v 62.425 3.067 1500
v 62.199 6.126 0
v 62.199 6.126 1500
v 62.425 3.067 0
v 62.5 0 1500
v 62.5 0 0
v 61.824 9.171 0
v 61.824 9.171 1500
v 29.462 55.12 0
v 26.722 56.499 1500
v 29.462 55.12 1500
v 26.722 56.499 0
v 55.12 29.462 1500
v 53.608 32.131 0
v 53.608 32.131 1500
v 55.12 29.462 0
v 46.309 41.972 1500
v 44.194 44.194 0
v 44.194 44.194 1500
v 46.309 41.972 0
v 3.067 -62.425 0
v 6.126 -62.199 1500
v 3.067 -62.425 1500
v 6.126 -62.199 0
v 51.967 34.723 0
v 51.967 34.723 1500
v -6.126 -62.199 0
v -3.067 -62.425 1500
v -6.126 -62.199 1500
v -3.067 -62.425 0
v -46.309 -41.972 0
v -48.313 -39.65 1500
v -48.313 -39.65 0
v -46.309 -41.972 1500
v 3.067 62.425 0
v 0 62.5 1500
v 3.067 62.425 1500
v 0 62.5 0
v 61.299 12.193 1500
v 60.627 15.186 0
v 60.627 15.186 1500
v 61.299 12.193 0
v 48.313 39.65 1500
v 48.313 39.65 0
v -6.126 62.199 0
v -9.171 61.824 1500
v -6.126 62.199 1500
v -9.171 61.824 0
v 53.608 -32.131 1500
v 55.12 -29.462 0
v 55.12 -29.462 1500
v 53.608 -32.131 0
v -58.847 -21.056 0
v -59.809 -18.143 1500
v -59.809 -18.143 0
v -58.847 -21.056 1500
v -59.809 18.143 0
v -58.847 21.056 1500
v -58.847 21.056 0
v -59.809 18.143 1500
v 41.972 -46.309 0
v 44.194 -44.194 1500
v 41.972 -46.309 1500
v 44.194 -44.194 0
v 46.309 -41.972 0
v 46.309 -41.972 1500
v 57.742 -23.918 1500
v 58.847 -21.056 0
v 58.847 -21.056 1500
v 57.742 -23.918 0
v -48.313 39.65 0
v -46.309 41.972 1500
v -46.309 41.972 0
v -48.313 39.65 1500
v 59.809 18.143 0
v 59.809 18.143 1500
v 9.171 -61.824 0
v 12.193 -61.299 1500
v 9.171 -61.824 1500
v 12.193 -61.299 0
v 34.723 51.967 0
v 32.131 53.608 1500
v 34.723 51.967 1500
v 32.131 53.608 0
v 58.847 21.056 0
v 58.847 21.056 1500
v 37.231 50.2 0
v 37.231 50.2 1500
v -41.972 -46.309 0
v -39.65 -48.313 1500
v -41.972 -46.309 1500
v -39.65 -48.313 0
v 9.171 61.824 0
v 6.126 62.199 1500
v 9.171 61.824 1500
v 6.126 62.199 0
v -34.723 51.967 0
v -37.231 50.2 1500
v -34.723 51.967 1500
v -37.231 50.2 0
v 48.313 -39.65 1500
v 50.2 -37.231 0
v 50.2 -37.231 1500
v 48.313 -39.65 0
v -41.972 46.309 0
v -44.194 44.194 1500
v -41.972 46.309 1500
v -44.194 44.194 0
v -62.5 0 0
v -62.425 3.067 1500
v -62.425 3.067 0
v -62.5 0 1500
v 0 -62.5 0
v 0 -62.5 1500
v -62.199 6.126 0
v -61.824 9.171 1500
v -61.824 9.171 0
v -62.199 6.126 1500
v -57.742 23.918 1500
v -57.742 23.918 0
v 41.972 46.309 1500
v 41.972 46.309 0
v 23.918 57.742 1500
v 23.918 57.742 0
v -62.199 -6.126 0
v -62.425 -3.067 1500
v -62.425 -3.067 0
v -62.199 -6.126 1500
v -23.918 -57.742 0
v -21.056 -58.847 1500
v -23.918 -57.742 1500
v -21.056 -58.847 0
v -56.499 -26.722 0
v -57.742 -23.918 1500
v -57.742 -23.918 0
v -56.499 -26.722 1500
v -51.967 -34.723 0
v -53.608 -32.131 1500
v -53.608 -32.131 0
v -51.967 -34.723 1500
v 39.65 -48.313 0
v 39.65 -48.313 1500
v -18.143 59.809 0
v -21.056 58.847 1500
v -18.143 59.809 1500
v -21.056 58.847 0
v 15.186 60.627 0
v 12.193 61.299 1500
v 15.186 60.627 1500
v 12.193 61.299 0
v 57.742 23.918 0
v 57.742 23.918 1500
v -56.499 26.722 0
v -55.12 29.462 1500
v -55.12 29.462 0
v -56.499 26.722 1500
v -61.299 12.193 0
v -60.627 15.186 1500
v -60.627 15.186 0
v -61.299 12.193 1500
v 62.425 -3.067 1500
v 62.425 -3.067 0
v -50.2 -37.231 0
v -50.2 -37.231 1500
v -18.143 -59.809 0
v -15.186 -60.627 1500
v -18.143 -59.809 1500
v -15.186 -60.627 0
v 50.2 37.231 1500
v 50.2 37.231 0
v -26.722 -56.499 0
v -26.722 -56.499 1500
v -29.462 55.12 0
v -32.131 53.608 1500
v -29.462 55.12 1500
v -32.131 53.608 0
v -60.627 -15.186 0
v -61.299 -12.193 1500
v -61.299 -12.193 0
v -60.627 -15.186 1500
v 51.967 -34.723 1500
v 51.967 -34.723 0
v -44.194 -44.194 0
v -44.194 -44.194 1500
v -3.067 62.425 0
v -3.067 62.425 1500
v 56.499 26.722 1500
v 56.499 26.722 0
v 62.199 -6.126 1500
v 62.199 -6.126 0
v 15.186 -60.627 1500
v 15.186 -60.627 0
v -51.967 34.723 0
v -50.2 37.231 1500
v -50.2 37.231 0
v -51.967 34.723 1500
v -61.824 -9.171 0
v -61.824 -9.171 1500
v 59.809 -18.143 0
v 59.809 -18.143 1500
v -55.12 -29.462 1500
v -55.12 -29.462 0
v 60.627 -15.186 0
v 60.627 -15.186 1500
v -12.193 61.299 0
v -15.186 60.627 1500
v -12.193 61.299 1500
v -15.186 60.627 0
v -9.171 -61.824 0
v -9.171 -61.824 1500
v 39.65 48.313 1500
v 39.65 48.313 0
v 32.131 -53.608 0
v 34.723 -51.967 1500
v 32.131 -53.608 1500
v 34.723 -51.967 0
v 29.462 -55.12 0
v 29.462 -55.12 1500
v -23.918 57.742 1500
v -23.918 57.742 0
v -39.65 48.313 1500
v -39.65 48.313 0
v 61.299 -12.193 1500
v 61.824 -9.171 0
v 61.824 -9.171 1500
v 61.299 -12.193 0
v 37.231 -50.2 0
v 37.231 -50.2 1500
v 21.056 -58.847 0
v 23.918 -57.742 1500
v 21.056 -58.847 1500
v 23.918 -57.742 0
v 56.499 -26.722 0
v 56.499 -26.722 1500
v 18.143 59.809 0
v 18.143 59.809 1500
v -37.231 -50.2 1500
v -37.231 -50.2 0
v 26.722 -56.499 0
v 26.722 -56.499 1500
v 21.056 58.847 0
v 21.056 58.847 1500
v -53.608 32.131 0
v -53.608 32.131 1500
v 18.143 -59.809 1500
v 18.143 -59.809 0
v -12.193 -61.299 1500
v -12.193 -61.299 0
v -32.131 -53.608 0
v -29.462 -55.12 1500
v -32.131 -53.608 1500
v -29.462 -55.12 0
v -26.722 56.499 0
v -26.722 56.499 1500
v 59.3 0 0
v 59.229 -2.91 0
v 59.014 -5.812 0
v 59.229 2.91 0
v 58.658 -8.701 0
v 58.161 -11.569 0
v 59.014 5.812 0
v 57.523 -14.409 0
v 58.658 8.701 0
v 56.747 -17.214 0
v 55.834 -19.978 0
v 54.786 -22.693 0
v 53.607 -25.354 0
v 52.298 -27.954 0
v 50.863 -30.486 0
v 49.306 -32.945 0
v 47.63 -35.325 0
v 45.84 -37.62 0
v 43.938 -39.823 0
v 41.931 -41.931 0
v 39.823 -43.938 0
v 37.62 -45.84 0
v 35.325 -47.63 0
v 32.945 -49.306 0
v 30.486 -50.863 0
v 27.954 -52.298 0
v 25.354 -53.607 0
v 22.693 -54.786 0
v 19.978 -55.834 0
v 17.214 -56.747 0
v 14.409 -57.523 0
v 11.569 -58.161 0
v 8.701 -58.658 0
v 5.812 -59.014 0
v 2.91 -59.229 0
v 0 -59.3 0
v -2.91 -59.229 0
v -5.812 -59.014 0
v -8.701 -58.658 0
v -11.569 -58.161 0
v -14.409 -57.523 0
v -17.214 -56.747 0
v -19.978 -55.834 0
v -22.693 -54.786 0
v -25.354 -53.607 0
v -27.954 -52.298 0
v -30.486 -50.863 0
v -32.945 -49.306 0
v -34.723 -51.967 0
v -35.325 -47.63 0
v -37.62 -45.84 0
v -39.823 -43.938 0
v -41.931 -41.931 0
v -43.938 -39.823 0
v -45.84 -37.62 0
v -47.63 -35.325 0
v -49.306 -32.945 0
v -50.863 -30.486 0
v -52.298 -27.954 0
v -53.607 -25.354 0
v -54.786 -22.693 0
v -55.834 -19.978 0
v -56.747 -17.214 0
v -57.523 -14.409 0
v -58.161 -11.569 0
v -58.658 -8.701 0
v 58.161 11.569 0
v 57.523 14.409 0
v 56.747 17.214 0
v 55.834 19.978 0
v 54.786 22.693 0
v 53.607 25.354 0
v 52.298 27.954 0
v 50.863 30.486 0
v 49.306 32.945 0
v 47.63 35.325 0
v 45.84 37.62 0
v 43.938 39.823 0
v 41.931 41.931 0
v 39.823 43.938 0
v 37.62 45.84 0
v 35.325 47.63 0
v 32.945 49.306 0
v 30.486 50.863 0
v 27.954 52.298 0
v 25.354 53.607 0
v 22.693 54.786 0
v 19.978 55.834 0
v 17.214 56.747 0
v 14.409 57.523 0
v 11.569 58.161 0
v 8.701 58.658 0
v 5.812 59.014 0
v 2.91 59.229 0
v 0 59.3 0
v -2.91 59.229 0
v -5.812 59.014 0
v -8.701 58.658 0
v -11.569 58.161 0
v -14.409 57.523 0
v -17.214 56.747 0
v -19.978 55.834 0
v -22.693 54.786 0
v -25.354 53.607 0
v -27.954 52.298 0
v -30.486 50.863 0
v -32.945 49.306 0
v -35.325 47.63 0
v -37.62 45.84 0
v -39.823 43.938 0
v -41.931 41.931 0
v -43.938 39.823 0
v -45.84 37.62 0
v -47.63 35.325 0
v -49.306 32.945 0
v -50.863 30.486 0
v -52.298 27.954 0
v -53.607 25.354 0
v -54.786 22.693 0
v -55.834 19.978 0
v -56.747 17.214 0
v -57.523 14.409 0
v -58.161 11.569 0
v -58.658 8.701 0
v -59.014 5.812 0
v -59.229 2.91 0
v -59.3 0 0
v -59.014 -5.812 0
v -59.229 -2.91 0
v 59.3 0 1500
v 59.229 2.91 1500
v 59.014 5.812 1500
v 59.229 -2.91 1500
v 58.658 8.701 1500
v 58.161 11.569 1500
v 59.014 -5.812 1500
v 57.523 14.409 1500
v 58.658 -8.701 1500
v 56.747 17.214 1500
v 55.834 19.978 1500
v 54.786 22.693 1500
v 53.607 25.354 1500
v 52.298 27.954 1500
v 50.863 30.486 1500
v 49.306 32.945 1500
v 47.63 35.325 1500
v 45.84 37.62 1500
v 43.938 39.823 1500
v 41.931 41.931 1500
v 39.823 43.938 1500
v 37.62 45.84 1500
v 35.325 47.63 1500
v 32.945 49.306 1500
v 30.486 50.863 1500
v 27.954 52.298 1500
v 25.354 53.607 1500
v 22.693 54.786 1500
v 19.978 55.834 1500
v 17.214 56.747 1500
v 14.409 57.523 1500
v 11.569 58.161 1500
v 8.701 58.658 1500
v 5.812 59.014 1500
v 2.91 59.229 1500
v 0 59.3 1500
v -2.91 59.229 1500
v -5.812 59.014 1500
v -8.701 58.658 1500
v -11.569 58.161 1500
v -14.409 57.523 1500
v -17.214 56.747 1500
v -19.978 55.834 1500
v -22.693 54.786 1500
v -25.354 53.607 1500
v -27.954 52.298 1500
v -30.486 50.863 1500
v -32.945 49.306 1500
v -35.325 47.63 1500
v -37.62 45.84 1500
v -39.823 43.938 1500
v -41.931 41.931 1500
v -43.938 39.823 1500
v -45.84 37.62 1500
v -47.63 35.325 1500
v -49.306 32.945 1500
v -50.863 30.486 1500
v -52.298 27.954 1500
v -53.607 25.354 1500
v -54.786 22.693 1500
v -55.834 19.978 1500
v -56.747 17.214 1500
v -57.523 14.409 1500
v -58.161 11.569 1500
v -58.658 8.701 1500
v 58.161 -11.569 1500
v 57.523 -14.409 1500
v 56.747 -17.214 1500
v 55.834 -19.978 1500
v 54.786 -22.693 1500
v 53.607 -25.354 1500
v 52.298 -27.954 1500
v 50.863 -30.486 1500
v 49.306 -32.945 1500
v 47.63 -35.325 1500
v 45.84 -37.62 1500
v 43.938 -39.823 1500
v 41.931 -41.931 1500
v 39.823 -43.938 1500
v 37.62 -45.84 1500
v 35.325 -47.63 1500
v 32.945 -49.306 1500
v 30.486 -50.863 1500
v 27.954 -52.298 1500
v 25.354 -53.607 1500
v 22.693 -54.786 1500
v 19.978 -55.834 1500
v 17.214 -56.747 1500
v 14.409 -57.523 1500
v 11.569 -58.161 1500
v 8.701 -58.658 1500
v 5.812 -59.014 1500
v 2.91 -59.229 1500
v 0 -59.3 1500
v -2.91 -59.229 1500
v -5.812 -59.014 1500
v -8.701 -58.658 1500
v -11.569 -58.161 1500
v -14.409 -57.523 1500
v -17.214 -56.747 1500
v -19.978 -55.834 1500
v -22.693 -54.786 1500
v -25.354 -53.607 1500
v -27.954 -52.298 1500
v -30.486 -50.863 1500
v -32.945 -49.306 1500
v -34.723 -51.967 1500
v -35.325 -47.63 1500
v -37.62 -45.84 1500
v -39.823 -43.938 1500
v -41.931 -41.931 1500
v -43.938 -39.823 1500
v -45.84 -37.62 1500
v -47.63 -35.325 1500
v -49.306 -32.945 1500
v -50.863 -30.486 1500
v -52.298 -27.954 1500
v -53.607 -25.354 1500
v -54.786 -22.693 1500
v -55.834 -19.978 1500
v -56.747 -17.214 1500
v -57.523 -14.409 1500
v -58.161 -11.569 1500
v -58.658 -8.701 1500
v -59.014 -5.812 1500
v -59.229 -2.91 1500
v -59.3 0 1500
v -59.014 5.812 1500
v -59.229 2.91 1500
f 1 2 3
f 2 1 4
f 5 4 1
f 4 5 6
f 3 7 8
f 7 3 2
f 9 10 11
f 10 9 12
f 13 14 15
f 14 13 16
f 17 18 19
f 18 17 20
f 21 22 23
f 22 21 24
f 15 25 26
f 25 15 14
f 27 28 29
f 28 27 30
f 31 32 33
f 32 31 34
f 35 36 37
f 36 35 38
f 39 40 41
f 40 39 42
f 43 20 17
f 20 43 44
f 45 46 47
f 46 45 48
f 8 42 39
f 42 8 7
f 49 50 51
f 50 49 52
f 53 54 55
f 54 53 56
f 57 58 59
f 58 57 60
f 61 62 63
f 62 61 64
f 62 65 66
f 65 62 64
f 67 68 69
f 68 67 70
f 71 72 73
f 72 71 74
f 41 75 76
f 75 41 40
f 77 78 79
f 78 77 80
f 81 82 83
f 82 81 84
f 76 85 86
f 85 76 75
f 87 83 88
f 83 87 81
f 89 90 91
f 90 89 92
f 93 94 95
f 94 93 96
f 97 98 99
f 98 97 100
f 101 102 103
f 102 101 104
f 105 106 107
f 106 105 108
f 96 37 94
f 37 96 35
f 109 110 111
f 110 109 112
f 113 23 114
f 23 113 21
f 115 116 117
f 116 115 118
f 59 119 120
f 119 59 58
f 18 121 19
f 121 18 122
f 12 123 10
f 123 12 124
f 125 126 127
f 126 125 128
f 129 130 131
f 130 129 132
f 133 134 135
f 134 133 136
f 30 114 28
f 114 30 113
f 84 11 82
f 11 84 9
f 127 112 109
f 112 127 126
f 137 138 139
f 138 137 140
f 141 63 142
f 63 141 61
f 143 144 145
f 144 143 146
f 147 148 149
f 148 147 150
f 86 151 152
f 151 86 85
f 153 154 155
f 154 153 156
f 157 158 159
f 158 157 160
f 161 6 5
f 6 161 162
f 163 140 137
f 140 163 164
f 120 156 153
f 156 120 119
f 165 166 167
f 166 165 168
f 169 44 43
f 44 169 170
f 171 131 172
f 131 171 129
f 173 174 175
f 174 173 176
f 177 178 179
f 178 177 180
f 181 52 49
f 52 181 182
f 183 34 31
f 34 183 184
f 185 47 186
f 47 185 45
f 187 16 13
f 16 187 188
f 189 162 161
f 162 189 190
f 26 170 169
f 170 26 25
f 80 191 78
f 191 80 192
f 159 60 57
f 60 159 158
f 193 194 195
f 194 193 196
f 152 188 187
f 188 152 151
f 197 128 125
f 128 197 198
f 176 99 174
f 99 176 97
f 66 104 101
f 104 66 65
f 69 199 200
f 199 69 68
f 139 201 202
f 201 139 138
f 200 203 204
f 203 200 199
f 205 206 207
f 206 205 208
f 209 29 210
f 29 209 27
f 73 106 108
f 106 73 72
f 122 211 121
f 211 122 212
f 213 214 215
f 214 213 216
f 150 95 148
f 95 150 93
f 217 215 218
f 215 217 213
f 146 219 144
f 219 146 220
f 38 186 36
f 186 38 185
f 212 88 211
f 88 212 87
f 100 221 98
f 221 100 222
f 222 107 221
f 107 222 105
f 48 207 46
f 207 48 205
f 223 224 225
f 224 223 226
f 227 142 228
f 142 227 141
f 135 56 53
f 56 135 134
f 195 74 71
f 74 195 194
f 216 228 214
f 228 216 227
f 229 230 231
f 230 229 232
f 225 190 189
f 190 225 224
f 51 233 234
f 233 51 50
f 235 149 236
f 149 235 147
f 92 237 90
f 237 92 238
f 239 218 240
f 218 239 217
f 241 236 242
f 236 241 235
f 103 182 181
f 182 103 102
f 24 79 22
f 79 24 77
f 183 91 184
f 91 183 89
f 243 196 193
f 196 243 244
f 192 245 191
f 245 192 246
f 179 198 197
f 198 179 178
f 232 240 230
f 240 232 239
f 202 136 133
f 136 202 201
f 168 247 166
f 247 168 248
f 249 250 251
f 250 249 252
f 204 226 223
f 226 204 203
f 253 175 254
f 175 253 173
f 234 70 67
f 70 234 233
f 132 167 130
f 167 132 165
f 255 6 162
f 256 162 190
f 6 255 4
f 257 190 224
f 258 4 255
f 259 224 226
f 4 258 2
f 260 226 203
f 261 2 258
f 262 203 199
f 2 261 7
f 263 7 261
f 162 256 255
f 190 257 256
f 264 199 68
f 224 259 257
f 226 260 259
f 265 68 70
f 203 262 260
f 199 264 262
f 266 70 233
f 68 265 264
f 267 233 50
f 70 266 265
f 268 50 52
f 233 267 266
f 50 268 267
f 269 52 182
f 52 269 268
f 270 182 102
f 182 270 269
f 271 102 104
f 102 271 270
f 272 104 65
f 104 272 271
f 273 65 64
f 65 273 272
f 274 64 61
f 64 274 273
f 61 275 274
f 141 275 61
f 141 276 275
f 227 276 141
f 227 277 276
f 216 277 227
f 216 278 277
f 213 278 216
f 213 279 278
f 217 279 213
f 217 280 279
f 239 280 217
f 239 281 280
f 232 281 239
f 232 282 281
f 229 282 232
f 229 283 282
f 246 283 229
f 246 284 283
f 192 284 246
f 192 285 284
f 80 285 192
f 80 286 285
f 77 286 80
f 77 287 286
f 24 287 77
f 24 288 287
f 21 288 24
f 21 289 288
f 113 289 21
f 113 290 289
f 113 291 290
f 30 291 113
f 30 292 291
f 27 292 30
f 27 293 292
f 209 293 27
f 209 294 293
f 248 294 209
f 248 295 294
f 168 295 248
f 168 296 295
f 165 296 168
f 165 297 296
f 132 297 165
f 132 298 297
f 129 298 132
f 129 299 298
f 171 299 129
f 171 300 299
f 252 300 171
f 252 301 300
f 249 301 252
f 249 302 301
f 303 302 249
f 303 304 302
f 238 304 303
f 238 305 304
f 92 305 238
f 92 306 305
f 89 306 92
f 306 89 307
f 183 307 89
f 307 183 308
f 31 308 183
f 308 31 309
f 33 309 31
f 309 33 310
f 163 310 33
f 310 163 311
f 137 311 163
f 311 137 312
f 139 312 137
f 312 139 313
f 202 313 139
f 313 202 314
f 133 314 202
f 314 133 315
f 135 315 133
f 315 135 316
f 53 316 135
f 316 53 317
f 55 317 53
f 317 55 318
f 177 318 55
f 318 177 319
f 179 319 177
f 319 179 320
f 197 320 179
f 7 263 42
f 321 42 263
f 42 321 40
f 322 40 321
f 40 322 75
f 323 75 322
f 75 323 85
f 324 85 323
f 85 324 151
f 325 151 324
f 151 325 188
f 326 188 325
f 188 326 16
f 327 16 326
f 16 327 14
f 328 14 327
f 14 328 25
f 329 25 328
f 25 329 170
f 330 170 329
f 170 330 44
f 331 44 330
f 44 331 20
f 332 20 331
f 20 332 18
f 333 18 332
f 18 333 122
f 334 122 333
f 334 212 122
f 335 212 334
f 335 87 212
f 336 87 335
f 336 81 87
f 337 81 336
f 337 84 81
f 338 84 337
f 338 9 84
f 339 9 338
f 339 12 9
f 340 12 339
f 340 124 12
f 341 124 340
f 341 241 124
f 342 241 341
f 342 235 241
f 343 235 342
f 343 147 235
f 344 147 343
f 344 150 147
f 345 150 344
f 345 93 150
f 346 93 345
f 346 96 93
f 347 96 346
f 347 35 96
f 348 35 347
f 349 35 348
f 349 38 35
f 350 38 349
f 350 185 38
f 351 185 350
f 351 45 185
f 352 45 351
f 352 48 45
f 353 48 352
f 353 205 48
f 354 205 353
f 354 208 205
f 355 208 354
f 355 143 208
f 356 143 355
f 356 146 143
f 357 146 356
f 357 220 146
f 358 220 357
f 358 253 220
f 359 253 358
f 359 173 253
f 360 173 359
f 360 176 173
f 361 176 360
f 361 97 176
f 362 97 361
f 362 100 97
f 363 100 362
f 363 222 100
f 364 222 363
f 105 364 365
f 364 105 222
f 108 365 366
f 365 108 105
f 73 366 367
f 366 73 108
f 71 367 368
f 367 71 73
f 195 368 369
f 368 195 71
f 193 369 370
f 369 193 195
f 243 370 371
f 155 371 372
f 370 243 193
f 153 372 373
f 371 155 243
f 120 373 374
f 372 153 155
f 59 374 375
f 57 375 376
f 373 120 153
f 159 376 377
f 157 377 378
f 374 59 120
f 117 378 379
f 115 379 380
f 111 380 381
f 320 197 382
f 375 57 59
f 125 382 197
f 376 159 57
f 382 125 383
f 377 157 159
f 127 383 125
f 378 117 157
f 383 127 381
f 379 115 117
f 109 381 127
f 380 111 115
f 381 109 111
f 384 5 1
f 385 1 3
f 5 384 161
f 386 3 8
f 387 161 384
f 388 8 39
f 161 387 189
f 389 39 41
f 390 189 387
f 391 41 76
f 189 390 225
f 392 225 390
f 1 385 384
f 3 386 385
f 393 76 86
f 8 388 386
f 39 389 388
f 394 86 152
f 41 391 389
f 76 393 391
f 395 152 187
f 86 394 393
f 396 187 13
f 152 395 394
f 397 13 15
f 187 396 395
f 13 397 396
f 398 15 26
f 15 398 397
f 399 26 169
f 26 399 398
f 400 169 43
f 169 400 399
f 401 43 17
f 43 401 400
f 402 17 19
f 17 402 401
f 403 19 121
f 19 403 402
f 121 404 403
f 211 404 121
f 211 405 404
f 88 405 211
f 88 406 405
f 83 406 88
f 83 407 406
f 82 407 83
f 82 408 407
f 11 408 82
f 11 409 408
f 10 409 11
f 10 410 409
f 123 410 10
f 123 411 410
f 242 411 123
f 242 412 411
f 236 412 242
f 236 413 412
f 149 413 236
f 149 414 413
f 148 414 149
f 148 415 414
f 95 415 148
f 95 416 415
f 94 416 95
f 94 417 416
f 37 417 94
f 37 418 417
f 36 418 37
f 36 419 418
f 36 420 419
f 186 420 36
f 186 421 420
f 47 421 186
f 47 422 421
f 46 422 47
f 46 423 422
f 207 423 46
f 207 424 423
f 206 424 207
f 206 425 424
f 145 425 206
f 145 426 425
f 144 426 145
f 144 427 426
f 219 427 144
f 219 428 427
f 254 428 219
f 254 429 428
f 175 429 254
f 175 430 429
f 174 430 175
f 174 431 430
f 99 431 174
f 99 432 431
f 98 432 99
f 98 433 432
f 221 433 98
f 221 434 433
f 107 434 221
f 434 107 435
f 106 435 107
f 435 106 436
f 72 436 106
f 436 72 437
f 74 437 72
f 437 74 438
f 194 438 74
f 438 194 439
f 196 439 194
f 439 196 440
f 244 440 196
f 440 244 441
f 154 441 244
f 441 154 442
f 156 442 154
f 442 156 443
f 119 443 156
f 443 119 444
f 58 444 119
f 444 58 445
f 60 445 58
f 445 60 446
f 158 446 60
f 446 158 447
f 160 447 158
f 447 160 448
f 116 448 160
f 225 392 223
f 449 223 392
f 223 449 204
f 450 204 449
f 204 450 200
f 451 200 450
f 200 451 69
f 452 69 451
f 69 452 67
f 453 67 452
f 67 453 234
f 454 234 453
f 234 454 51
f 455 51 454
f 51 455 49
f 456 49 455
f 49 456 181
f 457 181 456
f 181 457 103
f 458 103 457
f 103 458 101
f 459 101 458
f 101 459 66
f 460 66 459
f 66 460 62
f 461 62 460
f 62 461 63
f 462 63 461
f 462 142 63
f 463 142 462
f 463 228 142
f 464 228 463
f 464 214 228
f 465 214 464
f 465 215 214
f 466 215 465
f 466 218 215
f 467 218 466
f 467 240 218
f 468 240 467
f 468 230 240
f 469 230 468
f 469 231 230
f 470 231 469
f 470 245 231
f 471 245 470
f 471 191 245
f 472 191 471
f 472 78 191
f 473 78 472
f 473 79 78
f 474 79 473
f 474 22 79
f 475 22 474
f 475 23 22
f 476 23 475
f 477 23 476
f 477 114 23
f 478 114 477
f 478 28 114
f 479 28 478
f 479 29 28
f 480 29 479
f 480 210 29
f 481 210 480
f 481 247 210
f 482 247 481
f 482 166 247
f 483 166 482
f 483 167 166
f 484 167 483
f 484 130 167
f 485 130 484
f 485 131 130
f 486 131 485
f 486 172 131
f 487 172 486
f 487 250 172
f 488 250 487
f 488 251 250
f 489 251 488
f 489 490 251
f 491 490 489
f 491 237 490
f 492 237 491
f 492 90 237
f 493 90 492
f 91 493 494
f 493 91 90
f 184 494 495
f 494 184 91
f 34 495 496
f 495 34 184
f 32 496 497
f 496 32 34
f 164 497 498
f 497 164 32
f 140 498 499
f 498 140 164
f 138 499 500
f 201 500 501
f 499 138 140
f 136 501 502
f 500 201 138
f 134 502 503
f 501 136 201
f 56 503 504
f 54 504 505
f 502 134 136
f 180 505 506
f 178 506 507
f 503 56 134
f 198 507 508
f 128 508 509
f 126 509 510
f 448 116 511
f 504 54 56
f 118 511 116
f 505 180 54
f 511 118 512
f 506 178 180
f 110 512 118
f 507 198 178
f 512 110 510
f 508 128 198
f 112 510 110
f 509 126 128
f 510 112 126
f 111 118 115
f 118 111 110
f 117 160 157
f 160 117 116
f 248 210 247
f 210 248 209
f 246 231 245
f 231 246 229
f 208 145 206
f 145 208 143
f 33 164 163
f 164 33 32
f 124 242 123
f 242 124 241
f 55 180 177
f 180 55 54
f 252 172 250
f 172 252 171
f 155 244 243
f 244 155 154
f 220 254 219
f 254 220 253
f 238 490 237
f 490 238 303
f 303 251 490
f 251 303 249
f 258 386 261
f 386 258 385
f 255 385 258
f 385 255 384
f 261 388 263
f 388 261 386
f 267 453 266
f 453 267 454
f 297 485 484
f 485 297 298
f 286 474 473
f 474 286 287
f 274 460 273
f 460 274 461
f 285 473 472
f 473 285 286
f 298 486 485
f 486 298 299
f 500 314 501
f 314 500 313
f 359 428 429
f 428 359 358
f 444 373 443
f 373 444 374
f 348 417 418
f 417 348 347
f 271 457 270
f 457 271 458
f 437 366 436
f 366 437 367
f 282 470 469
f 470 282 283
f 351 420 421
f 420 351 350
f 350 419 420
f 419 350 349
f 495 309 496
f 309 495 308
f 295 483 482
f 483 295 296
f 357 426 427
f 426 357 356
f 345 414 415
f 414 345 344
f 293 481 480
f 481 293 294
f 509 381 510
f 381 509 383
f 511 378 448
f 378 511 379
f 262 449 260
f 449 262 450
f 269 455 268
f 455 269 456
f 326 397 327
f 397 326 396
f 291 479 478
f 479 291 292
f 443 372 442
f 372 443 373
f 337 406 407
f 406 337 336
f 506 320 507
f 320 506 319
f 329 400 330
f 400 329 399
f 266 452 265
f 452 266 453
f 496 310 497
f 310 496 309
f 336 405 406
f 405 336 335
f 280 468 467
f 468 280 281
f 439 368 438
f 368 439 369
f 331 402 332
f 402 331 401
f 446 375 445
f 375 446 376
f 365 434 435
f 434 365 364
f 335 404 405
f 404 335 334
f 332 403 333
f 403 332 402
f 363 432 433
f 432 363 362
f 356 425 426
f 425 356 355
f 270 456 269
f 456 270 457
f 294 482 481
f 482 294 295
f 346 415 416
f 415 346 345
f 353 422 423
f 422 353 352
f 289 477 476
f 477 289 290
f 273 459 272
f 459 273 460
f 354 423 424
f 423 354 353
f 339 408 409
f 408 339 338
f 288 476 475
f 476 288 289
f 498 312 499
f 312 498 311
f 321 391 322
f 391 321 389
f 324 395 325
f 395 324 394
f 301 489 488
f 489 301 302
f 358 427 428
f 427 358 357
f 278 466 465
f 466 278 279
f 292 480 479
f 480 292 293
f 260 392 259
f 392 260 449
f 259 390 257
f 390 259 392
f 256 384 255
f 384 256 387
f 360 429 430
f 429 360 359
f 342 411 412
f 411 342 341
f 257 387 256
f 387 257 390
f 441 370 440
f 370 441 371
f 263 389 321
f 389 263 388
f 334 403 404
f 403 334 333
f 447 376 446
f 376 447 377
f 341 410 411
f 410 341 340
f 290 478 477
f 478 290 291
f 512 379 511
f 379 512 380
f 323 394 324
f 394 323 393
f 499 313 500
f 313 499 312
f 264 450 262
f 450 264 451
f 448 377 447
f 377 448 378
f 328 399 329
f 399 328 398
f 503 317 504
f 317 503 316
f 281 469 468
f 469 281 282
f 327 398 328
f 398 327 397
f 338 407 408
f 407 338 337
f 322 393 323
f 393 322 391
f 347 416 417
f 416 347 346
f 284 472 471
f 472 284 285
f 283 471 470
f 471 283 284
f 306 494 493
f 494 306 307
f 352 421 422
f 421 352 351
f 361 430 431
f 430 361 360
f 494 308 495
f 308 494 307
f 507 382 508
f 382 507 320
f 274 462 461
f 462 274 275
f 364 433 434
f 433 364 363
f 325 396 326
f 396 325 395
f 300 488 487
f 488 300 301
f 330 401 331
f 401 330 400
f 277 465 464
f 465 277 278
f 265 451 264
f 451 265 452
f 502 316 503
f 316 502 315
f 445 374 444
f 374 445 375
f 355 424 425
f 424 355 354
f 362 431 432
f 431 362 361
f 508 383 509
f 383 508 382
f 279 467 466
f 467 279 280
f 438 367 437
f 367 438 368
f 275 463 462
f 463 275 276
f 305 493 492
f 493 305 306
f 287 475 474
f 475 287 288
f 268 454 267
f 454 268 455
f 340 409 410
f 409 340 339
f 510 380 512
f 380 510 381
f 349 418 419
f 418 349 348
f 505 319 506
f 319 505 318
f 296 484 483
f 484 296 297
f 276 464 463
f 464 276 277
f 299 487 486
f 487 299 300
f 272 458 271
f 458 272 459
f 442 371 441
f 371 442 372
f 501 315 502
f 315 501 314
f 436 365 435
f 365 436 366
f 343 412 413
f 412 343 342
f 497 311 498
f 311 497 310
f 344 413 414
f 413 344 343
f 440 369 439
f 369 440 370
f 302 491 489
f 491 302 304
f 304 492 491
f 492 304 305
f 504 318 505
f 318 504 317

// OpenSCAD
$fn = 128;

// HT pipe parameters (mm)
pipe_dn = 125;          // nominal diameter
pipe_length = 1500;     // length

// Assumptions for a typical HT (PP) DN125 pipe:
// - Outer diameter ~ 125 mm
// - Wall thickness ~ 3.2 mm (common for DN125 HT pipes)
od = 125;
wall = 3.2;
id = od - 2*wall;

module ht_pipe(od, id, length) {
    difference() {
        cylinder(h = length, d = od, center = false);
        translate([0,0,-0.5])
            cylinder(h = length + 1, d = id, center = false);
    }
}

ht_pipe(od, id, pipe_length);
